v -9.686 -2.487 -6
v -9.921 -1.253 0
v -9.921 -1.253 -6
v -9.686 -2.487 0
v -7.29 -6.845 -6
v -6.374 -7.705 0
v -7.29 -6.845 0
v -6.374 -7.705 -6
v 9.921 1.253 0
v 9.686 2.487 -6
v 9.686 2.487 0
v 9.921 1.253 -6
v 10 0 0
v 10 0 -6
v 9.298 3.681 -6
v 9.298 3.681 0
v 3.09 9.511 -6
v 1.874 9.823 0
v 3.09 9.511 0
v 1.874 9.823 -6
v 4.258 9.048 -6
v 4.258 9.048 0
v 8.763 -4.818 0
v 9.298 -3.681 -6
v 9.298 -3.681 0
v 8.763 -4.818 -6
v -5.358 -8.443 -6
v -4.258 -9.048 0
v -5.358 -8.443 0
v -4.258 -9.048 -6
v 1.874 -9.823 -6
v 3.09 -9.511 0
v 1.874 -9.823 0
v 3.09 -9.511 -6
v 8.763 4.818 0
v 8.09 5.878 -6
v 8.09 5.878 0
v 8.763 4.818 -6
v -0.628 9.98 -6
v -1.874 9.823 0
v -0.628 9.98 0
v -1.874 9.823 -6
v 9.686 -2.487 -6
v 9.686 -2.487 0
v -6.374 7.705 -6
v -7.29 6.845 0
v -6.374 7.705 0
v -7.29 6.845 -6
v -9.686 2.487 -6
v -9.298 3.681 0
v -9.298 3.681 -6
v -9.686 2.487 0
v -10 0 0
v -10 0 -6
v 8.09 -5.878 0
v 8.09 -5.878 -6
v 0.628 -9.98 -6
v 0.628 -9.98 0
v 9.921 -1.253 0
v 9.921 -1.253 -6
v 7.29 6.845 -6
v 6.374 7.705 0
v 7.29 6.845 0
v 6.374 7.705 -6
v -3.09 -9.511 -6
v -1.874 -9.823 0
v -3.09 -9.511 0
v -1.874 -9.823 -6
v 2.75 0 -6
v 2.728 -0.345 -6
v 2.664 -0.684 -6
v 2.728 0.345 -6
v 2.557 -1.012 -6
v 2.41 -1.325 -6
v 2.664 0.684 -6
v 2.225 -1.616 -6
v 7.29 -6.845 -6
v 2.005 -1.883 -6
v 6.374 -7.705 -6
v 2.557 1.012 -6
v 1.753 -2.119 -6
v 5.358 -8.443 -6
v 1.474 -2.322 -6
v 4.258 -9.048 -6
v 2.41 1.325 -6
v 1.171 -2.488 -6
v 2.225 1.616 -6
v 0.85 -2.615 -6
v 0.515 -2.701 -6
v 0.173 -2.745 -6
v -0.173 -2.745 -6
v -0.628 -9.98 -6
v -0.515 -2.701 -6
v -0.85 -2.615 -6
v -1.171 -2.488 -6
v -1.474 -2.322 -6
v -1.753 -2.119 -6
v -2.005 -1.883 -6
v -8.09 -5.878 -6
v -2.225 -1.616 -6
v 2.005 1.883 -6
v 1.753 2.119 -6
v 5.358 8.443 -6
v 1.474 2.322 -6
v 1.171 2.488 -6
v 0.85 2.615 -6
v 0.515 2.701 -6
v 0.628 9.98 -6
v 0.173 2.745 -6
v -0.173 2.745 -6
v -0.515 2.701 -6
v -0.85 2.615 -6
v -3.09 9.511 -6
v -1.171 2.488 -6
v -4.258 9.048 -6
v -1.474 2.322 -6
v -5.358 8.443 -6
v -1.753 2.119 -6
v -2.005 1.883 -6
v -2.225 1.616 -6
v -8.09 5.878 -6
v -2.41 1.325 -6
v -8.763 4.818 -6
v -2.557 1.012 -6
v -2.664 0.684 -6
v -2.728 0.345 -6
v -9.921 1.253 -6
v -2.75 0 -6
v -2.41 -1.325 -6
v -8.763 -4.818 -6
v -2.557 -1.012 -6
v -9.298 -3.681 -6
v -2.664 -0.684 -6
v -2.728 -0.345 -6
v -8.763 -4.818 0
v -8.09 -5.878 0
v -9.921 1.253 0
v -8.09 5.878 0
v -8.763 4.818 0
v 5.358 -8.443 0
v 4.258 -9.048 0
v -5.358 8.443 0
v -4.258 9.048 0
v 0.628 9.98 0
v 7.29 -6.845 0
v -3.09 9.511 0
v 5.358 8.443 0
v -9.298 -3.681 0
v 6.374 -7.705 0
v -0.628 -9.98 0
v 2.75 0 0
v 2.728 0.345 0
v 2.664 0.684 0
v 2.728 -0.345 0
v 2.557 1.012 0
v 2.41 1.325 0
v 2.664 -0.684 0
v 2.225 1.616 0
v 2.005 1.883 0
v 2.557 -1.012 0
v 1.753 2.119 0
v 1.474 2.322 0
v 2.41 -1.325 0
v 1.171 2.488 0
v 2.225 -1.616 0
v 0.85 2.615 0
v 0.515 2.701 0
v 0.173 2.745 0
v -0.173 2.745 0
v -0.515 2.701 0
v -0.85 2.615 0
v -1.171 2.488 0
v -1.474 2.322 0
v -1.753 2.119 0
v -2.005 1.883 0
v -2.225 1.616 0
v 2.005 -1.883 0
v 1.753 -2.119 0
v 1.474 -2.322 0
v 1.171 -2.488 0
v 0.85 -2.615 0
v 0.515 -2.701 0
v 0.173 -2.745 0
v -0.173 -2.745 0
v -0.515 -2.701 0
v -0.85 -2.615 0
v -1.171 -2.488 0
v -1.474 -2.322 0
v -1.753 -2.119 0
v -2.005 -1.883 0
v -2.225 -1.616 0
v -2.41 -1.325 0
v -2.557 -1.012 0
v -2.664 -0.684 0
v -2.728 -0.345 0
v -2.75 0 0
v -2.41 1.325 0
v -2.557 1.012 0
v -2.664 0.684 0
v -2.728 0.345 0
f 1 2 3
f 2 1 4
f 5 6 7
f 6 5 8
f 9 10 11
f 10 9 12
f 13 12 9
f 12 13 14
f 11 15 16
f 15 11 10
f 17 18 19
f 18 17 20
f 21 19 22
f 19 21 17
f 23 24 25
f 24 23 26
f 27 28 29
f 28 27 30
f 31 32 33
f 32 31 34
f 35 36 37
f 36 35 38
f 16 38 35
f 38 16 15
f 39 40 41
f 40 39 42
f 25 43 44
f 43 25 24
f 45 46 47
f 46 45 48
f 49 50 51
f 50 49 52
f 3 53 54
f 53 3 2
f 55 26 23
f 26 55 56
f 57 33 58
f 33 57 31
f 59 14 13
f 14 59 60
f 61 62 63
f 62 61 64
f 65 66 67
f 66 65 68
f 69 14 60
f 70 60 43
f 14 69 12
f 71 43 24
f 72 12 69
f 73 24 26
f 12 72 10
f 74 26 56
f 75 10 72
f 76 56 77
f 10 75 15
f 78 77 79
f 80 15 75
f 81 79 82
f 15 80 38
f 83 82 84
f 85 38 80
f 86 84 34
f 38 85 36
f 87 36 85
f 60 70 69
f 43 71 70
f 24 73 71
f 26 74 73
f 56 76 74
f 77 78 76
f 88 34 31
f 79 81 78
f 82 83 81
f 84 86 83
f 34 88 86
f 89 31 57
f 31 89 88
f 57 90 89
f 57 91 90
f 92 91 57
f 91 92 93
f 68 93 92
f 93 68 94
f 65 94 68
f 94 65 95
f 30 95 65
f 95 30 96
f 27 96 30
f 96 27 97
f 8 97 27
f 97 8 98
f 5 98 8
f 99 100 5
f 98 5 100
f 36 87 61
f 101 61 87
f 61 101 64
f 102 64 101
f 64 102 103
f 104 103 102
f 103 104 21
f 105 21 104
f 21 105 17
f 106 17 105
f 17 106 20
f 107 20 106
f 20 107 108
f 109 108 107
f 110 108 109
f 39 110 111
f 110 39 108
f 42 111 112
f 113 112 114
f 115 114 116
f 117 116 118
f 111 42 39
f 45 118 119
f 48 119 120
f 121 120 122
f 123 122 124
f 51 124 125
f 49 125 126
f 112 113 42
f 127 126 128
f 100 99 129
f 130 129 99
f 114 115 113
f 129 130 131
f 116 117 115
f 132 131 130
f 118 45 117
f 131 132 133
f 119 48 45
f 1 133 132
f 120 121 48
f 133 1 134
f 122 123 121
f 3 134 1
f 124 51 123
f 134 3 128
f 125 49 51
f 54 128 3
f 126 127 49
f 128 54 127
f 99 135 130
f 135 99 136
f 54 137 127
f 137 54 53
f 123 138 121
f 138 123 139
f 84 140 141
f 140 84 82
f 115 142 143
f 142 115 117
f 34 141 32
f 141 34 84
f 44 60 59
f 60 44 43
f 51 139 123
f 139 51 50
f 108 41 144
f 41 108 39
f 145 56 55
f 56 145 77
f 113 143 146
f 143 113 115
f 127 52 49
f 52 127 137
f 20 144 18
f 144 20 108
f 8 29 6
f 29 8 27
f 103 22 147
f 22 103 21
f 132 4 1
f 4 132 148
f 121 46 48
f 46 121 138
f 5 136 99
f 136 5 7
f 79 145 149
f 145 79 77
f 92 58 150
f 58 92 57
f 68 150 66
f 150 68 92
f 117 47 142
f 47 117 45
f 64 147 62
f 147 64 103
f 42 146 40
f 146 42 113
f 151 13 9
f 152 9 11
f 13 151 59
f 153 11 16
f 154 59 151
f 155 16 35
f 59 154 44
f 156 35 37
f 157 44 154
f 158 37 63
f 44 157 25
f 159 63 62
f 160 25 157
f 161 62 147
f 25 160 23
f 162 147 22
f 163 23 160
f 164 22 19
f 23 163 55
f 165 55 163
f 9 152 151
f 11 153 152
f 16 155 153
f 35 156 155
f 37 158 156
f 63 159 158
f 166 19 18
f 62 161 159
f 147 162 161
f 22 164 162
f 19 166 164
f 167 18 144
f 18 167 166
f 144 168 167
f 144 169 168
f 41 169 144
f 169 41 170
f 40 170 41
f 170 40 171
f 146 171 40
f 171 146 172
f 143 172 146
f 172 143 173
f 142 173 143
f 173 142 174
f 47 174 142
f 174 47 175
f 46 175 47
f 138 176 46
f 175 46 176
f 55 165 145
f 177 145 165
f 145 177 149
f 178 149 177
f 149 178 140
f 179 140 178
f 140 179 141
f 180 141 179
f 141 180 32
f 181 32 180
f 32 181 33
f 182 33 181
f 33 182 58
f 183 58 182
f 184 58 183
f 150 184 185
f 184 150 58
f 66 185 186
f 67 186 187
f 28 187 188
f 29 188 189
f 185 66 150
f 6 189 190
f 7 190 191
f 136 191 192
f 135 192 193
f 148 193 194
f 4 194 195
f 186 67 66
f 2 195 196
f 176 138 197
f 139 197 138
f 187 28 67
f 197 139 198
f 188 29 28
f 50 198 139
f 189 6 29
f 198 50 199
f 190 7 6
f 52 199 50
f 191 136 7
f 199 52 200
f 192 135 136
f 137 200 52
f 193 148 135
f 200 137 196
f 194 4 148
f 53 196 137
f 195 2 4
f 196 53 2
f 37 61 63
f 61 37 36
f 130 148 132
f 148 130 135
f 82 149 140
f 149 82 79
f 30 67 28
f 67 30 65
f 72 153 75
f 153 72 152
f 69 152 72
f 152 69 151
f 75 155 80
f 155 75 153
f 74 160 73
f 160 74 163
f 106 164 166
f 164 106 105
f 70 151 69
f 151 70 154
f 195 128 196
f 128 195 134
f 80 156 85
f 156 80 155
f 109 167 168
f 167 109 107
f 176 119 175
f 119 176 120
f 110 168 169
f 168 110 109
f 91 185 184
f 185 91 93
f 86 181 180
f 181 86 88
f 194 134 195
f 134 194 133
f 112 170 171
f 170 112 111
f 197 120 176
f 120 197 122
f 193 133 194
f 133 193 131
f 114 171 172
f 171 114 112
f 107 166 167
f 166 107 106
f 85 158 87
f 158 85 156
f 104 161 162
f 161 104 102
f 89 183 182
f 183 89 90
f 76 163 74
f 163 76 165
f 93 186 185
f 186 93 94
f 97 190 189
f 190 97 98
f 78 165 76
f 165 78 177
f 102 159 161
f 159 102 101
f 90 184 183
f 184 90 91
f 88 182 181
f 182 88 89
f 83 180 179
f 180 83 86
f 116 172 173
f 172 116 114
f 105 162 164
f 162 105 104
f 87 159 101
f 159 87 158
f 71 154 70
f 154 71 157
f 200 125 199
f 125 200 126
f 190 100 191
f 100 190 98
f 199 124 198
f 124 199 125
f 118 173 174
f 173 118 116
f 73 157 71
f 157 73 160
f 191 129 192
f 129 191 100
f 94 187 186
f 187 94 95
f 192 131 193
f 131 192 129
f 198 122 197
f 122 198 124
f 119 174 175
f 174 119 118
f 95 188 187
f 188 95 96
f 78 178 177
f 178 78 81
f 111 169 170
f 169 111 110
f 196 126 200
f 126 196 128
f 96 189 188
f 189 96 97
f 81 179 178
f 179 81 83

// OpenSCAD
$fn = 50;


difference() {
	union() {
		translate(v = [0, 0, -6.0000000000]) {
			cylinder(h = 6, r = 10.0000000000);
		}
		cylinder(h = 0, r = 16.0000000000);
	}
	union() {
		#translate(v = [0, 0, -6]) {
			cylinder(h = 6, r = 2.7500000000);
		}
	}
}
